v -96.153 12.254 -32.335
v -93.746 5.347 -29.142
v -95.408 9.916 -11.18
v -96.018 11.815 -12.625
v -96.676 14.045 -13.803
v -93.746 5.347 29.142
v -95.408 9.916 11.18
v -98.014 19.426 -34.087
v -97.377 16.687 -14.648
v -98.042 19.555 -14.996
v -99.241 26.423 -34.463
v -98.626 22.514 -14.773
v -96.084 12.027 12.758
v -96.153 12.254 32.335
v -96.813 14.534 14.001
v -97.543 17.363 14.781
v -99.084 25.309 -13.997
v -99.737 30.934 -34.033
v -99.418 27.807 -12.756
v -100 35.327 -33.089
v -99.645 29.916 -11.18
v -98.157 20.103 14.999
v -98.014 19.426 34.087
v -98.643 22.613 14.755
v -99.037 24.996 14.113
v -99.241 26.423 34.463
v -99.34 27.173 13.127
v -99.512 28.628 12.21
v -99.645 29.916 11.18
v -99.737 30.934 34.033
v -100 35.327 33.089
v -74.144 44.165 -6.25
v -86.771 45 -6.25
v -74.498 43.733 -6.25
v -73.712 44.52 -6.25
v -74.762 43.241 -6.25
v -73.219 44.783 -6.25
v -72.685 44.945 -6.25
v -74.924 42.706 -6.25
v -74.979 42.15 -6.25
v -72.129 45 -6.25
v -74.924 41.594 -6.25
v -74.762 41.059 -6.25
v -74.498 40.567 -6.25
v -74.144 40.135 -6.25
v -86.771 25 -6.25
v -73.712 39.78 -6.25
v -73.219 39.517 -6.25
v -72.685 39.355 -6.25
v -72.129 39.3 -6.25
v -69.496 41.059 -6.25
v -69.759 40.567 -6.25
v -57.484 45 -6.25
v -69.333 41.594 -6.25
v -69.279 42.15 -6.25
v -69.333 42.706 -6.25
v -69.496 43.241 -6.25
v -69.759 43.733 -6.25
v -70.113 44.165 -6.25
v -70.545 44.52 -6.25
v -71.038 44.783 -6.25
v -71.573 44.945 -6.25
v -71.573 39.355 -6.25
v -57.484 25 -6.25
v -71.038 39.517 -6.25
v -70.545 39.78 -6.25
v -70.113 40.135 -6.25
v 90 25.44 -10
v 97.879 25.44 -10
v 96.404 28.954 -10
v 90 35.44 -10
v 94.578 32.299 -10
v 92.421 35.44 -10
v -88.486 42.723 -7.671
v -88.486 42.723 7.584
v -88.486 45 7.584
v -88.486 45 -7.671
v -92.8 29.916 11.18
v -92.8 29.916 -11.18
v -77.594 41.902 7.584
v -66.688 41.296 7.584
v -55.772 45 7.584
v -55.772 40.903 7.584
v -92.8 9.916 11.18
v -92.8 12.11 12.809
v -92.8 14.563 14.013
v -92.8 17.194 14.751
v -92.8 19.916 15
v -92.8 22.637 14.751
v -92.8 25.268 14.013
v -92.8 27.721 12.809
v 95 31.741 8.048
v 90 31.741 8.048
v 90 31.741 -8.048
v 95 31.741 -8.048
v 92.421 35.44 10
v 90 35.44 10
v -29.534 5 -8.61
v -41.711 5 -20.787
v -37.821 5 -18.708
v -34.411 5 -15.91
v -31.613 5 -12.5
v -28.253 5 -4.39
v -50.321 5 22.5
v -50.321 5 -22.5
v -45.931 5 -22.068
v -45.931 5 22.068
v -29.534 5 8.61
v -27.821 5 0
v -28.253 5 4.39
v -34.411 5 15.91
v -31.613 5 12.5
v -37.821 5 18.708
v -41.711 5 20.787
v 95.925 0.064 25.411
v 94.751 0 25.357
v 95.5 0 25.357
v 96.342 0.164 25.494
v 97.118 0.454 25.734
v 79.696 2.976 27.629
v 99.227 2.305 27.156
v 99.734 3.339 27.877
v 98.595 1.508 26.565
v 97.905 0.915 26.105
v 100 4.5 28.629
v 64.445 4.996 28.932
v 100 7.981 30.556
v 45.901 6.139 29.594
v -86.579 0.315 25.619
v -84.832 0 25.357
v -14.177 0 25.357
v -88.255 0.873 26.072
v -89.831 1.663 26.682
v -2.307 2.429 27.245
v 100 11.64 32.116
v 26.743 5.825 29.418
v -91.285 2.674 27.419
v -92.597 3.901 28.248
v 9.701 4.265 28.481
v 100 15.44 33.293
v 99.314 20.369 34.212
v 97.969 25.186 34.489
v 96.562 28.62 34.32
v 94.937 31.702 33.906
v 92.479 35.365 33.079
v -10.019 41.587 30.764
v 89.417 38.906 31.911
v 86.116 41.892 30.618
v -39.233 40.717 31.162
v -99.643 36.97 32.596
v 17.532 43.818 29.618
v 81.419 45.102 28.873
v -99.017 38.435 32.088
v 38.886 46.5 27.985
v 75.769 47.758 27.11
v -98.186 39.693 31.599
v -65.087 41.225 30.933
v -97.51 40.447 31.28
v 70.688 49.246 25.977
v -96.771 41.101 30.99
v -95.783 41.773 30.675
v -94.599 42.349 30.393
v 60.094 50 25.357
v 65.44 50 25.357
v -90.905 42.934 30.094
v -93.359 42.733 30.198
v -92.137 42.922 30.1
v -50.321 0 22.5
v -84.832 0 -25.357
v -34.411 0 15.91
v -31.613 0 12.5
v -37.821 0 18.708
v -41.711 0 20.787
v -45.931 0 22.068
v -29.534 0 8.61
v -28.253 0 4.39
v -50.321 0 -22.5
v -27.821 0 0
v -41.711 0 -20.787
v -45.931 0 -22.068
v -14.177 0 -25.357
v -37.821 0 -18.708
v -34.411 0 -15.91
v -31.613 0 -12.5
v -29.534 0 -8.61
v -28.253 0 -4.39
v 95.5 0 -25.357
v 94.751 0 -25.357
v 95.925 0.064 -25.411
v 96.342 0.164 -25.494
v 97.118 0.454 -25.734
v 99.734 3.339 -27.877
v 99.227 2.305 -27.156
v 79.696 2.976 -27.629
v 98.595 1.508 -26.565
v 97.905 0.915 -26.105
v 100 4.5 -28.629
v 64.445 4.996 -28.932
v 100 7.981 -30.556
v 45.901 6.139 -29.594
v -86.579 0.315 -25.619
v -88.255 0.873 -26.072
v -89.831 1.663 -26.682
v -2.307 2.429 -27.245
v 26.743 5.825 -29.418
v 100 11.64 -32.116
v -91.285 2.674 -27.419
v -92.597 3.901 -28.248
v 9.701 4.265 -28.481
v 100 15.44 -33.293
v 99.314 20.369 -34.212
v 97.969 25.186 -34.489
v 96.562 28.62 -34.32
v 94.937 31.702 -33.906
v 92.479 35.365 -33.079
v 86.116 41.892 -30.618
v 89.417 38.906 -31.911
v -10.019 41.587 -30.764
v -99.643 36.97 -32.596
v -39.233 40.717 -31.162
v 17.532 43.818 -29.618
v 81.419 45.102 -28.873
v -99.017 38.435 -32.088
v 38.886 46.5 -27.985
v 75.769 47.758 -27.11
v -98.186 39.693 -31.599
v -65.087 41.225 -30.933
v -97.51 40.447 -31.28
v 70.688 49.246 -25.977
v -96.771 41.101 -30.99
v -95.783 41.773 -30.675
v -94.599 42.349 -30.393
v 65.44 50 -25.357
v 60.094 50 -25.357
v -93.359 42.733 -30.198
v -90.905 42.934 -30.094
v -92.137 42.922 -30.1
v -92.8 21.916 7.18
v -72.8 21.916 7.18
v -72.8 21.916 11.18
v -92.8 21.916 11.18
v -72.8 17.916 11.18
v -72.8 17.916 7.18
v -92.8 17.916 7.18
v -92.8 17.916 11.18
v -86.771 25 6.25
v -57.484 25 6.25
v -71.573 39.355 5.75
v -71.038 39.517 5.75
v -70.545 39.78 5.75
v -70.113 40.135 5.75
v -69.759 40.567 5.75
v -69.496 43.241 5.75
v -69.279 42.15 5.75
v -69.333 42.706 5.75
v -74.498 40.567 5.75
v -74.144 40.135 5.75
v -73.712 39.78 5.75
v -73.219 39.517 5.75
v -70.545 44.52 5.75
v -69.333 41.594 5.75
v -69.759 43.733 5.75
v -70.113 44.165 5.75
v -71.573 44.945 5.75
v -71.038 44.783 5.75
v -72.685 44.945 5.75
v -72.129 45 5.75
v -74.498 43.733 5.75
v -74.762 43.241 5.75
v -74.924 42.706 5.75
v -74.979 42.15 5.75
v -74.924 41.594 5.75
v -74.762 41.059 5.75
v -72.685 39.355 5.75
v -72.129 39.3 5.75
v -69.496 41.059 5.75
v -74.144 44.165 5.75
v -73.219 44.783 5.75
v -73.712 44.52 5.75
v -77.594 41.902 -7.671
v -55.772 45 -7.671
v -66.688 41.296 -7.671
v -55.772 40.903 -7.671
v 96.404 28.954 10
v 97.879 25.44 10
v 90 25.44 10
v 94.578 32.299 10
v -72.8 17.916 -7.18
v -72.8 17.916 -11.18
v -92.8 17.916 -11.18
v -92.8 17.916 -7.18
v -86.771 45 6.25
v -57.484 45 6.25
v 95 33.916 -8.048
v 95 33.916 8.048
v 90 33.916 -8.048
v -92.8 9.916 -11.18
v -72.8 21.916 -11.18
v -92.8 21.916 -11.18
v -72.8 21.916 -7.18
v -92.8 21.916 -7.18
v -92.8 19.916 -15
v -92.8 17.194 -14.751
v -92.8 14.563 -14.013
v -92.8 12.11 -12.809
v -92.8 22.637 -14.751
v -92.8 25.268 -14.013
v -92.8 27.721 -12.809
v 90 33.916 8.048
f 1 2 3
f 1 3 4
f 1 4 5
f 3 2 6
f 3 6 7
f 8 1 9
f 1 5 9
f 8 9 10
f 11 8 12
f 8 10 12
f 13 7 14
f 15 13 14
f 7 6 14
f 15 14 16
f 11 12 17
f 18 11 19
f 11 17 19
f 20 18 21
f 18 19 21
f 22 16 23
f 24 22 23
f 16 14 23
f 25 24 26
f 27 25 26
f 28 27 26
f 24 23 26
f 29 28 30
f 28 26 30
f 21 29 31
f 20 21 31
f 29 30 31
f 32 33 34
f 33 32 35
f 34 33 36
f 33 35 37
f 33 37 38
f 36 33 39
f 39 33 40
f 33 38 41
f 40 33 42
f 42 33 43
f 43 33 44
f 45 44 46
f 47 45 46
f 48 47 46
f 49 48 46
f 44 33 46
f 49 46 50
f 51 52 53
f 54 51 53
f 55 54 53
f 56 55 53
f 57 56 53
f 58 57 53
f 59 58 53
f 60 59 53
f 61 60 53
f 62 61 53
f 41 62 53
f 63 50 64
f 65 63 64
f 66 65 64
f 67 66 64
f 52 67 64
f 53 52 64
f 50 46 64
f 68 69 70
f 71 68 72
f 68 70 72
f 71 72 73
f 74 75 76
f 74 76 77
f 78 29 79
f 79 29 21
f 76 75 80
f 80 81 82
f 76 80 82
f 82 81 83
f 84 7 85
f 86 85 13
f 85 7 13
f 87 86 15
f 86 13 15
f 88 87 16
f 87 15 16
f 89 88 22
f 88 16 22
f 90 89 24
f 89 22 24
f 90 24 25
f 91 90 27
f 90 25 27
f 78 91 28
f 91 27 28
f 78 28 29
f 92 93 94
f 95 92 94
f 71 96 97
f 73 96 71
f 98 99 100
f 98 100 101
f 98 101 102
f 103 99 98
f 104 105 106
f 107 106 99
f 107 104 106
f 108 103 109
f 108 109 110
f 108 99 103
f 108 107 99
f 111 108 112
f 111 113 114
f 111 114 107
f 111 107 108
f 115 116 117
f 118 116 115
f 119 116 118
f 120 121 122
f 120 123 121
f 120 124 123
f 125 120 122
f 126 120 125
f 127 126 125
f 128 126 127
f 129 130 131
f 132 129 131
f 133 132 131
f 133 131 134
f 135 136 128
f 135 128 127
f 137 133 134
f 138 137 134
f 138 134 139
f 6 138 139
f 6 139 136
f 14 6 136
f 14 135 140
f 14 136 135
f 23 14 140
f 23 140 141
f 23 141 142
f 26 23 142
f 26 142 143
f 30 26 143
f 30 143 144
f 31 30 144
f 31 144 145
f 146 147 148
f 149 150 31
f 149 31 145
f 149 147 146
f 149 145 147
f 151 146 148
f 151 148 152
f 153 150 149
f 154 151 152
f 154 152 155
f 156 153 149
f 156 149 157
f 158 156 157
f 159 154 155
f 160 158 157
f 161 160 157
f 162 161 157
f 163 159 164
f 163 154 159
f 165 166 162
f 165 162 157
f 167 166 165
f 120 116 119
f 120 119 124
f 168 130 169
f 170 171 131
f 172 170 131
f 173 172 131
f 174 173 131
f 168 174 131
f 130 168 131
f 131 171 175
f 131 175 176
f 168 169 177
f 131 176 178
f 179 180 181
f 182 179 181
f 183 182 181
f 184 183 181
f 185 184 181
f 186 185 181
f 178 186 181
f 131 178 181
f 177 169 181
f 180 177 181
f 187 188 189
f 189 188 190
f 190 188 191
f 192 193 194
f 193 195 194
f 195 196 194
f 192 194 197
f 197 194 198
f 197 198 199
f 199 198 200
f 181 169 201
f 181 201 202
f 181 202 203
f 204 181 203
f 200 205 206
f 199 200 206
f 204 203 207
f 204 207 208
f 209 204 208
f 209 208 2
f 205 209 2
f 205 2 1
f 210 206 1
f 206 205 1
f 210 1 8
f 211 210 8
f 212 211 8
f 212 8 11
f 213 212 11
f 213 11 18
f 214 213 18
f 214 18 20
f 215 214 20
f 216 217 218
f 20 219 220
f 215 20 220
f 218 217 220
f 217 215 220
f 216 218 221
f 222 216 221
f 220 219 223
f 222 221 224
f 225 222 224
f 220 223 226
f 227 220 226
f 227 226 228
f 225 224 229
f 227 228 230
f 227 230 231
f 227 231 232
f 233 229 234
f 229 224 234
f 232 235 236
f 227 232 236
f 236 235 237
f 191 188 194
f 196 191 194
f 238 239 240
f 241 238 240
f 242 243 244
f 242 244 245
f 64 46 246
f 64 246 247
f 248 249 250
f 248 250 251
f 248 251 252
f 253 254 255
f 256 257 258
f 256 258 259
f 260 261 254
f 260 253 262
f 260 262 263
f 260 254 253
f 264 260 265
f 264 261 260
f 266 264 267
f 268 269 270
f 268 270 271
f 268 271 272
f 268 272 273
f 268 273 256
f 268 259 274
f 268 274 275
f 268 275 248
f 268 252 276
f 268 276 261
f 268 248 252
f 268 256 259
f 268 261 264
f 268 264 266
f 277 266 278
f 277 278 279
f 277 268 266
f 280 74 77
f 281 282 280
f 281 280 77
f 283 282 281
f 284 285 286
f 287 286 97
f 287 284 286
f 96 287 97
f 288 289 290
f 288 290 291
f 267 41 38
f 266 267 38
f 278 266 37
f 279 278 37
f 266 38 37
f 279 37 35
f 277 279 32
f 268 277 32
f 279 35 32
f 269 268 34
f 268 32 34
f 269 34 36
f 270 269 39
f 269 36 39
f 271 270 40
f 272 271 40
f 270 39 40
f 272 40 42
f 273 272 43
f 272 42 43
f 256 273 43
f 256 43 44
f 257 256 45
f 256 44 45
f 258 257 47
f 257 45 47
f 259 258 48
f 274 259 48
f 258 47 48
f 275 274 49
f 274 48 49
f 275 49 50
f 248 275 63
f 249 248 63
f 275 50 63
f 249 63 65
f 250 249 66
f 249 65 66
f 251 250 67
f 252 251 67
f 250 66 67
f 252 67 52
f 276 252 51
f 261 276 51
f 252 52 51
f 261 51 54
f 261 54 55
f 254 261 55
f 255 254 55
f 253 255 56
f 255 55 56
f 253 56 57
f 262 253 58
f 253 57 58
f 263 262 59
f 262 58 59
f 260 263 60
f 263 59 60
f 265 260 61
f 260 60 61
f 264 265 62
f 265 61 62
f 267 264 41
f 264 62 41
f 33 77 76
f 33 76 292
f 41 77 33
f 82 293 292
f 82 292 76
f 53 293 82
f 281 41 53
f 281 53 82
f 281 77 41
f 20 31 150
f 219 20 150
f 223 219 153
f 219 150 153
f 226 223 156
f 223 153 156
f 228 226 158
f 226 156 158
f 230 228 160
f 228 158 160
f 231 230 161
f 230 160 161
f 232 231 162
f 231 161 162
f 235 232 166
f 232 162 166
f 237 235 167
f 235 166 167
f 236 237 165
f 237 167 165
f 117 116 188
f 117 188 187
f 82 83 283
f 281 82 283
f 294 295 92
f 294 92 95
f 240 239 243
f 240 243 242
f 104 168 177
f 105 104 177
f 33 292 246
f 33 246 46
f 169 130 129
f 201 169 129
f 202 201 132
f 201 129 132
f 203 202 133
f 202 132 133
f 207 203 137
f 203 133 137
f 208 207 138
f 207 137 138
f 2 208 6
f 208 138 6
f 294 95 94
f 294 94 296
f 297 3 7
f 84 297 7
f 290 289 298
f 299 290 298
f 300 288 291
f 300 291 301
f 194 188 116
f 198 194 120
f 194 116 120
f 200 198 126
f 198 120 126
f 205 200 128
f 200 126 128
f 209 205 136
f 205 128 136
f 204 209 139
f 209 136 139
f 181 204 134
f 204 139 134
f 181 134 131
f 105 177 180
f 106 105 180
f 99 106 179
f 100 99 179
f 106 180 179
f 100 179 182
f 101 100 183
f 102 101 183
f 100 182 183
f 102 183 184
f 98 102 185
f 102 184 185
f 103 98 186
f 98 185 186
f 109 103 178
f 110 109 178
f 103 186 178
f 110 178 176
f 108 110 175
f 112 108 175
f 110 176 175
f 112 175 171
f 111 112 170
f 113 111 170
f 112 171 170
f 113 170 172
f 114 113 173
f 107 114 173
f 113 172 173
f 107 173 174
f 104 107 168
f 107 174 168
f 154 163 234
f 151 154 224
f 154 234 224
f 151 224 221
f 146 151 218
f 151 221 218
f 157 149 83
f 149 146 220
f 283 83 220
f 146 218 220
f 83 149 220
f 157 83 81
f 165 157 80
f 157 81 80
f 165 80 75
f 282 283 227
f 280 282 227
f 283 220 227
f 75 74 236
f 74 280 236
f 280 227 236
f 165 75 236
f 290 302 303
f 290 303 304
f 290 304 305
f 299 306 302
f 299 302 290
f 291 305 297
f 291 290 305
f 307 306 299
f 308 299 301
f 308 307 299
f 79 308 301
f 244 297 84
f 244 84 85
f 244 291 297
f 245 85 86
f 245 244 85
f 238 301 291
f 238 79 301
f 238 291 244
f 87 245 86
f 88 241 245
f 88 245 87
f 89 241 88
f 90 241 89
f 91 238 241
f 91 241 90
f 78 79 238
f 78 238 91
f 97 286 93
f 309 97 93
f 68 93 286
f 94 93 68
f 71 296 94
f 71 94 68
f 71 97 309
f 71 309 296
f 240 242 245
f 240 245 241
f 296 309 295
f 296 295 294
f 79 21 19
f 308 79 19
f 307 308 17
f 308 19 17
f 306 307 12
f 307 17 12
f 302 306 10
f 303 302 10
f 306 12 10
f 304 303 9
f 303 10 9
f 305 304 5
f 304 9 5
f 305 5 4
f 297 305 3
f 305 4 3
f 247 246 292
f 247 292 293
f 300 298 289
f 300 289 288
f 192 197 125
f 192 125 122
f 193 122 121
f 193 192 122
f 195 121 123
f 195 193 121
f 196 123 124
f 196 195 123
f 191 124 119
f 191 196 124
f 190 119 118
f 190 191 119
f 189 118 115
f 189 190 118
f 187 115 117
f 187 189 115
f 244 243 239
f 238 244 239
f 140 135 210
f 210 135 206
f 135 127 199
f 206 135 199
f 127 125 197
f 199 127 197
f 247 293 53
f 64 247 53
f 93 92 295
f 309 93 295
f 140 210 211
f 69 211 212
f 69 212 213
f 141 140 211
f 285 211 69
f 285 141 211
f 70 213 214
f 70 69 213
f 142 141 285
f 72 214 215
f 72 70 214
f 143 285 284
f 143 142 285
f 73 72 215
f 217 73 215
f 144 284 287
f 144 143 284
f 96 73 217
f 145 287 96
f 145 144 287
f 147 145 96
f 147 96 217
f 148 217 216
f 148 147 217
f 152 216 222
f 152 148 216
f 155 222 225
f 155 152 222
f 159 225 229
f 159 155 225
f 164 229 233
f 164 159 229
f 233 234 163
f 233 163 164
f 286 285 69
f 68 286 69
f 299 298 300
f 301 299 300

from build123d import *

# Parameters (mm, degrees)
SKETCH1_W           = 200
SKETCH1_H           = 70
BOSS_EXTRUDE1_DEPTH = 50
CUT_EXTRUDE5_DEPTH  = 200
CUT_EXTRUDE6_DEPTH  = 5
CUT_EXTRUDE7_DEPTH  = 40
CUT_EXTRUDE8_DEPTH  = 40
CUT_EXTRUDE9_DEPTH  = 40
SKETCH18_W          = 20
SKETCH18_H          = 10
CUT_EXTRUDE10_DEPTH = 20
SKETCH20_W          = 16.096890916
SKETCH20_H          = 2.175255529
BOSS_EXTRUDE2_DEPTH = 5
SKETCH22_W          = 29.287239855
SKETCH22_H          = 12.500651158
CUT_EXTRUDE11_DEPTH = 20
SKETCH23_W          = 32.71404676
SKETCH23_H          = 15.255254966
SKETCH23_W_2        = 29.287239855
SKETCH23_H_2        = 12.500651158
BOSS_EXTRUDE3_DEPTH = 20
SKETCH25_R          = 2.849998823
BOSS_EXTRUDE4_DEPTH = 12
CUT_EXTRUDE12_DEPTH = 12.2
SKETCH28_W          = 4
SKETCH28_H          = 4
CUT_EXTRUDE13_DEPTH = 20


with BuildPart() as part:
    # Sketch1 → Boss-Extrude1 (new body)
    with BuildSketch(Plane(origin=(0, 0, 0), x_dir=(1, 0, 0), z_dir=(0, 1, 0))):
        Rectangle(SKETCH1_W, SKETCH1_H)
    extrude(amount=BOSS_EXTRUDE1_DEPTH)

    # Sketch13 → Cut-Extrude5 (cut)
    with BuildSketch(Plane.ZY.offset(100)):
        with BuildLine():
            Line((-25.356792072, 50), (-35, 50))
            Line((-35, 50), (-35, 0))
            Line((-35, 0), (-25.356792072, 0))
            ThreePointArc((-25.356792072, 0), (-34.489414432, 25), (-25.356792072, 50))
        make_face()
    cut_extrude5 = extrude(amount=-CUT_EXTRUDE5_DEPTH, mode=Mode.SUBTRACT)

    # Mirror1: Cut-Extrude5 across plane
    add(cut_extrude5.mirror(Plane.XY), mode=Mode.SUBTRACT)

    # Sketch14 → Cut-Extrude6 (cut)
    with BuildSketch(Plane.XZ):
        with BuildLine():
            Line((-50.321008897, 22.5), (-50.321008897, -22.5))
            ThreePointArc((-50.321008897, -22.5), (-27.821008897, 0), (-50.321008897, 22.5))
        make_face()
    extrude(amount=-CUT_EXTRUDE6_DEPTH, mode=Mode.SUBTRACT)

    # Sketch15 → Cut-Extrude7 (cut, symmetric)
    with BuildSketch(Plane.XY):
        with BuildLine():
            Line((-14.177189609, 0), (94.750693697, 0))
            ThreePointArc((94.750693697, 0), (40.286752044, 6.203751873), (-14.177189609, 0))
        make_face()
    extrude(amount=CUT_EXTRUDE7_DEPTH, both=True, mode=Mode.SUBTRACT)

    # Sketch16 → Cut-Extrude8 (cut, symmetric)
    with BuildSketch(Plane.XY):
        with BuildLine():
            ThreePointArc((60.094183349, 50), (-19.72974209, 41.127256564), (-100, 43.823614043))
            Line((-100, 43.823614043), (-100, 50))
            Line((-100, 50), (60.094183349, 50))
        make_face()
        with BuildLine():
            Line((100, 0), (100, 4.500444902))
            ThreePointArc((100, 4.500444902), (98.543565753, 1.456434247), (95.499555098, 0))
            Line((95.499555098, 0), (100, 0))
        make_face()
        with BuildLine():
            ThreePointArc((100, 15.440425267), (89.162561497, 39.162561497), (65.440425267, 50))
            Line((65.440425267, 50), (100, 50))
            Line((100, 50), (100, 15.440425267))
        make_face()
    extrude(amount=CUT_EXTRUDE8_DEPTH, both=True, mode=Mode.SUBTRACT)

    # Sketch17 → Cut-Extrude9 (cut, symmetric)
    with BuildSketch(Plane.XY):
        with BuildLine():
            Line((-90.43469404, 42.891964914), (-105.221514707, 46.920266675))
            Line((-105.221514707, 46.920266675), (-103.893419297, 0))
            Line((-103.893419297, 0), (-84.831583922, 0))
            ThreePointArc((-84.831583922, 0), (-89.878284237, 1.691044202), (-93.746012604, 5.347475777))
            ThreePointArc((-93.746012604, 5.347475777), (-98.150815665, 20.070729134), (-100, 35.327104743))
            ThreePointArc((-100, 35.327104743), (-96.78408086, 41.090574557), (-90.43469404, 42.891964914))
        make_face()
    extrude(amount=CUT_EXTRUDE9_DEPTH, both=True, mode=Mode.SUBTRACT)

    # Sketch18 → Cut-Extrude10 (cut)
    with BuildSketch(Plane(origin=(110, 0, 0), x_dir=(0, 0, -1), z_dir=(1, 0, 0))):
        with Locations((0, 30.440425267)):
            Rectangle(SKETCH18_W, SKETCH18_H)
    extrude(amount=-CUT_EXTRUDE10_DEPTH, mode=Mode.SUBTRACT)

    # Sketch20 → Boss-Extrude2 (add)
    with BuildSketch(Plane(origin=(90, 0, 0), x_dir=(0, 0, -1), z_dir=(1, 0, 0))):
        with Locations((0, 32.828238053)):
            Rectangle(SKETCH20_W, SKETCH20_H)
    extrude(amount=BOSS_EXTRUDE2_DEPTH)

    # Sketch22 → Cut-Extrude11 (cut)
    with BuildSketch(Plane(origin=(0, 25, 0), x_dir=(1, 0, 0), z_dir=(0, 1, 0))):
        with Locations((-72.127800153, 0)):
            Rectangle(SKETCH22_W, SKETCH22_H)
    extrude(amount=CUT_EXTRUDE11_DEPTH, mode=Mode.SUBTRACT)

    # Sketch23 → Boss-Extrude3 (add)
    with BuildSketch(Plane(origin=(0, 25, 0), x_dir=(1, 0, 0), z_dir=(0, 1, 0))):
        with Locations((-72.128701672, 0.043393869)):
            Rectangle(SKETCH23_W, SKETCH23_H)
        with Locations((-72.127800153, 0)):
            Rectangle(SKETCH23_W_2, SKETCH23_H_2, mode=Mode.SUBTRACT)
    extrude(amount=BOSS_EXTRUDE3_DEPTH)

    # Sketch25 → Boss-Extrude4 (add)
    with BuildSketch(Plane.XY.offset(-6.250325579)):
        with Locations(Location((-72.128701672, 42.150001177, 0), (0, 0, 90))):
            Circle(SKETCH25_R)
    extrude(amount=BOSS_EXTRUDE4_DEPTH)

    # Sketch27 → Cut-Extrude12 (cut)
    with BuildSketch(Plane(origin=(-105, 0, 0), x_dir=(0, 0, -1), z_dir=(1, 0, 0))):
        with BuildLine():
            Line((-11.180339887, 29.915784745), (11.180339887, 29.915784745))
            ThreePointArc((11.180339887, 29.915784745), (15, 19.915784745), (11.180339887, 9.915784745))
            Line((11.180339887, 9.915784745), (-11.180339887, 9.915784745))
            ThreePointArc((-11.180339887, 9.915784745), (-15, 19.915784745), (-11.180339887, 29.915784745))
        make_face()
    extrude(amount=CUT_EXTRUDE12_DEPTH, mode=Mode.SUBTRACT)

    # Sketch28 → Cut-Extrude13 (cut)
    with BuildSketch(Plane.ZY.offset(92.8)):
        with Locations((-9.180339887, 19.915784745)):
            Rectangle(SKETCH28_W, SKETCH28_H)
        with Locations((9.180339887, 19.915784745)):
            Rectangle(SKETCH28_W, SKETCH28_H)
    extrude(amount=-CUT_EXTRUDE13_DEPTH, mode=Mode.SUBTRACT)


solid = part.part
